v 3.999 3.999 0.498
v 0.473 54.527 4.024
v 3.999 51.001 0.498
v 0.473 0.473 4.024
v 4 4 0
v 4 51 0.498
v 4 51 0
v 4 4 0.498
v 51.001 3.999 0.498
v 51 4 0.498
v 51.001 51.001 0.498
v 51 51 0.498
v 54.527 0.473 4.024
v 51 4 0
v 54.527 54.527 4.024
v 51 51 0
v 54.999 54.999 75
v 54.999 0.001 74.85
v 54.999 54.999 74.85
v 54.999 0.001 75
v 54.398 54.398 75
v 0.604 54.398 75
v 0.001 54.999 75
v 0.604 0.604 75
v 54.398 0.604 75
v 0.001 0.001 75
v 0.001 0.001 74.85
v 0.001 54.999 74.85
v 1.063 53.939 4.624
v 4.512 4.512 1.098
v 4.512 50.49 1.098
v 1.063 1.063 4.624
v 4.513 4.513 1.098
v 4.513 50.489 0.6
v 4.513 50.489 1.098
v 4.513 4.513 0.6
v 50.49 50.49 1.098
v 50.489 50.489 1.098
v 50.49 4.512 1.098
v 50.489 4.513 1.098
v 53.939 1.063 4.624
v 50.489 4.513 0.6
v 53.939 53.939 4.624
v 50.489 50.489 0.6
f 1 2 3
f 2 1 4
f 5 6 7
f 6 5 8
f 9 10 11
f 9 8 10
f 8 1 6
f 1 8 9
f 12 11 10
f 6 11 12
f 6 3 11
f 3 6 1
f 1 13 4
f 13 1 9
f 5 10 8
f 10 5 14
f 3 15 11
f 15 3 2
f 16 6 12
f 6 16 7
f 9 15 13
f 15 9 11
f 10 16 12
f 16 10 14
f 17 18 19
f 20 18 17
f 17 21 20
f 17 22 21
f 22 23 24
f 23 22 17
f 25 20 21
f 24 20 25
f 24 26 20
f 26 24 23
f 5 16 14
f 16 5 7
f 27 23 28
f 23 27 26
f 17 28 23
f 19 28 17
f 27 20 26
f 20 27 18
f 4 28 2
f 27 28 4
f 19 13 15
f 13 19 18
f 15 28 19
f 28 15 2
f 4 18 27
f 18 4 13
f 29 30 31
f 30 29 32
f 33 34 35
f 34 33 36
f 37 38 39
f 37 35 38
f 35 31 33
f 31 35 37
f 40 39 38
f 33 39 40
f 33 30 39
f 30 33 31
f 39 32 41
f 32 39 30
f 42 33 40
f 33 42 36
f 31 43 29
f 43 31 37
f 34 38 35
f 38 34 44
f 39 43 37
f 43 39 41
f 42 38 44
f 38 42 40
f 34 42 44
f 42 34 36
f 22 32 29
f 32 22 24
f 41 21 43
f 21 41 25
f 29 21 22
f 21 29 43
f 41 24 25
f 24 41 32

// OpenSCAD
// file: assorter.scad
// This should be the grid ;-D

include <defaults.scad>


module grid(
    x = 1,
    y = 1,
    cut_top = true,
    cut = cut_default,
    length = length_default,
    triangle_height = triangle_height_default,
){
    difference(){
        for (m = [0:y-1]){
            for (n = [0:x-1])
                translate([n*length,m*length,0])
                    field();
        }

        // clean front
        translate([-1,-(triangle_height+2),-1])
            cube([(length*x)+2,triangle_height+2,triangle_height+2]);

        // clean Back
        translate([-1,length*y,-1])
            cube([(length*x)+2,triangle_height+2,triangle_height+2]);

        // clean left
        translate([-(triangle_height+2),-1,-1])
            cube([triangle_height+2,(length*y)+2,triangle_height+2]);

        // clean right
        translate([length*x,-1,-1])
            cube([triangle_height+2,(length*y)+2,triangle_height+2]);

        if (cut_top){
        // cut top
        translate([-e,-e,triangle_height-cut])
            cube([length*x+(2*e),length*y+(2*e),2*cut]);
        }
    }
}

module triangle(
    length=length_default,
    triangle_width = triangle_width_default,
    triangle_height = triangle_height_default,
){
    lifted_triangle(
        length = length,
        triangle_width = triangle_width,
        triangle_height = triangle_height
    );
}

module simple_triangle(
    length=length_default,
    triangle_width = triangle_width_default,
    triangle_height = triangle_height_default,
){
    rotate([-90,0,0])
    linear_extrude(height=length)
        polygon([[-triangle_width/2,0],[0,-triangle_height],[triangle_width/2,0]]);
}


module lifted_triangle(
    length=length_default,
    triangle_width = triangle_width_default,
    triangle_height = triangle_height_default,
    lift = lift_default,
){
    translate([0,0,lift])
    rotate([-90,0,0])
    linear_extrude(height=length)
        polygon([[-triangle_width/2,0],[0,-triangle_height],[triangle_width/2,0]]);

    translate([-triangle_width/2,0,0])
        cube([triangle_width,length,lift]);
}

module field(
    length=length_default,
    triangle_width = triangle_width_default,
    triangle_height = triangle_height_default,
){
    translate([0,0,-e]){
        translate([0,length,0])
        rotate([0,0,-90])
            triangle(
                length = length,
                triangle_width = triangle_width,
                triangle_height = triangle_height
            );

        rotate([0,0,-90])
            triangle(
                length = length,
                triangle_width = triangle_width,
                triangle_height = triangle_height
            );

        translate([length,0,0])
            triangle(
                length = length,
                triangle_width = triangle_width,
                triangle_height = triangle_height
            );

        triangle(
            length = length,
            triangle_width = triangle_width,
            triangle_height = triangle_height
        );
    }
}

module box_solid(
    x = 1,
    y = 1,
    cut = cut_default,
    length = length_default,
    height = height_default,
){
    
    difference(){
        translate([e,e,0])
            cube([x*length-(2*e),y*length-(2*e),height]);
    
        grid(
                x=x,
                y=y,
                cut = cut,
                cut_top=false
                );
        // cut left side of box
        cut_object(
            length = length*y);

        // cut right side of box
        translate([length*x,0,0])
        mirror(v=[1,0,0])
             cut_object(length = length*y);
        
        // cut back of box
        translate([0,length*y,0])
        rotate([0,0,-90])
             cut_object(length = length*x);

        // cut front of box
        rotate([0,0,-90])
        mirror(v=[1,0,0])
             cut_object(length = length*x);

    }
}

module box(
    x = 1,
    y = 1,
    cut = cut_default,
    length=length_default,
    wall_thickness = wall_thickness_default,
){
    difference(){
            box_solid(
                x = x,
                y = y,
                cut = cut
                );


        translate([wall_thickness/2,wall_thickness/2,wall_thickness/2])
            resize([x*length-wall_thickness,y*length-wall_thickness,0])
            box_solid(
                x = x,
                y = y,
                cut = cut
                );

    }
}

module cut_object(
    length=length_default,
    height = height_default,
    diff_bottom = 0.5

){
    rotate([-90,0,0])
    linear_extrude(height=length)
     
        polygon(
            [   [-e,0],
                [-e,-height],
                [0,-height],
                [diff_bottom,0]
            ]
            );
}
// file: defaults.scad
//default variables for this project

length_default = 55;

height_default = 75;

triangle_height_default = 4 ;
triangle_width_default  = 2 * triangle_height_default;
cut_default=0.5;
lift_default=0.5;
e=0.001;

wall_thickness_default = 1.2;
// main file
// boxes ;-D

include <defaults.scad>
use <assorter.scad>

x = 1;
y = 1;

box(x=x,y=y);
